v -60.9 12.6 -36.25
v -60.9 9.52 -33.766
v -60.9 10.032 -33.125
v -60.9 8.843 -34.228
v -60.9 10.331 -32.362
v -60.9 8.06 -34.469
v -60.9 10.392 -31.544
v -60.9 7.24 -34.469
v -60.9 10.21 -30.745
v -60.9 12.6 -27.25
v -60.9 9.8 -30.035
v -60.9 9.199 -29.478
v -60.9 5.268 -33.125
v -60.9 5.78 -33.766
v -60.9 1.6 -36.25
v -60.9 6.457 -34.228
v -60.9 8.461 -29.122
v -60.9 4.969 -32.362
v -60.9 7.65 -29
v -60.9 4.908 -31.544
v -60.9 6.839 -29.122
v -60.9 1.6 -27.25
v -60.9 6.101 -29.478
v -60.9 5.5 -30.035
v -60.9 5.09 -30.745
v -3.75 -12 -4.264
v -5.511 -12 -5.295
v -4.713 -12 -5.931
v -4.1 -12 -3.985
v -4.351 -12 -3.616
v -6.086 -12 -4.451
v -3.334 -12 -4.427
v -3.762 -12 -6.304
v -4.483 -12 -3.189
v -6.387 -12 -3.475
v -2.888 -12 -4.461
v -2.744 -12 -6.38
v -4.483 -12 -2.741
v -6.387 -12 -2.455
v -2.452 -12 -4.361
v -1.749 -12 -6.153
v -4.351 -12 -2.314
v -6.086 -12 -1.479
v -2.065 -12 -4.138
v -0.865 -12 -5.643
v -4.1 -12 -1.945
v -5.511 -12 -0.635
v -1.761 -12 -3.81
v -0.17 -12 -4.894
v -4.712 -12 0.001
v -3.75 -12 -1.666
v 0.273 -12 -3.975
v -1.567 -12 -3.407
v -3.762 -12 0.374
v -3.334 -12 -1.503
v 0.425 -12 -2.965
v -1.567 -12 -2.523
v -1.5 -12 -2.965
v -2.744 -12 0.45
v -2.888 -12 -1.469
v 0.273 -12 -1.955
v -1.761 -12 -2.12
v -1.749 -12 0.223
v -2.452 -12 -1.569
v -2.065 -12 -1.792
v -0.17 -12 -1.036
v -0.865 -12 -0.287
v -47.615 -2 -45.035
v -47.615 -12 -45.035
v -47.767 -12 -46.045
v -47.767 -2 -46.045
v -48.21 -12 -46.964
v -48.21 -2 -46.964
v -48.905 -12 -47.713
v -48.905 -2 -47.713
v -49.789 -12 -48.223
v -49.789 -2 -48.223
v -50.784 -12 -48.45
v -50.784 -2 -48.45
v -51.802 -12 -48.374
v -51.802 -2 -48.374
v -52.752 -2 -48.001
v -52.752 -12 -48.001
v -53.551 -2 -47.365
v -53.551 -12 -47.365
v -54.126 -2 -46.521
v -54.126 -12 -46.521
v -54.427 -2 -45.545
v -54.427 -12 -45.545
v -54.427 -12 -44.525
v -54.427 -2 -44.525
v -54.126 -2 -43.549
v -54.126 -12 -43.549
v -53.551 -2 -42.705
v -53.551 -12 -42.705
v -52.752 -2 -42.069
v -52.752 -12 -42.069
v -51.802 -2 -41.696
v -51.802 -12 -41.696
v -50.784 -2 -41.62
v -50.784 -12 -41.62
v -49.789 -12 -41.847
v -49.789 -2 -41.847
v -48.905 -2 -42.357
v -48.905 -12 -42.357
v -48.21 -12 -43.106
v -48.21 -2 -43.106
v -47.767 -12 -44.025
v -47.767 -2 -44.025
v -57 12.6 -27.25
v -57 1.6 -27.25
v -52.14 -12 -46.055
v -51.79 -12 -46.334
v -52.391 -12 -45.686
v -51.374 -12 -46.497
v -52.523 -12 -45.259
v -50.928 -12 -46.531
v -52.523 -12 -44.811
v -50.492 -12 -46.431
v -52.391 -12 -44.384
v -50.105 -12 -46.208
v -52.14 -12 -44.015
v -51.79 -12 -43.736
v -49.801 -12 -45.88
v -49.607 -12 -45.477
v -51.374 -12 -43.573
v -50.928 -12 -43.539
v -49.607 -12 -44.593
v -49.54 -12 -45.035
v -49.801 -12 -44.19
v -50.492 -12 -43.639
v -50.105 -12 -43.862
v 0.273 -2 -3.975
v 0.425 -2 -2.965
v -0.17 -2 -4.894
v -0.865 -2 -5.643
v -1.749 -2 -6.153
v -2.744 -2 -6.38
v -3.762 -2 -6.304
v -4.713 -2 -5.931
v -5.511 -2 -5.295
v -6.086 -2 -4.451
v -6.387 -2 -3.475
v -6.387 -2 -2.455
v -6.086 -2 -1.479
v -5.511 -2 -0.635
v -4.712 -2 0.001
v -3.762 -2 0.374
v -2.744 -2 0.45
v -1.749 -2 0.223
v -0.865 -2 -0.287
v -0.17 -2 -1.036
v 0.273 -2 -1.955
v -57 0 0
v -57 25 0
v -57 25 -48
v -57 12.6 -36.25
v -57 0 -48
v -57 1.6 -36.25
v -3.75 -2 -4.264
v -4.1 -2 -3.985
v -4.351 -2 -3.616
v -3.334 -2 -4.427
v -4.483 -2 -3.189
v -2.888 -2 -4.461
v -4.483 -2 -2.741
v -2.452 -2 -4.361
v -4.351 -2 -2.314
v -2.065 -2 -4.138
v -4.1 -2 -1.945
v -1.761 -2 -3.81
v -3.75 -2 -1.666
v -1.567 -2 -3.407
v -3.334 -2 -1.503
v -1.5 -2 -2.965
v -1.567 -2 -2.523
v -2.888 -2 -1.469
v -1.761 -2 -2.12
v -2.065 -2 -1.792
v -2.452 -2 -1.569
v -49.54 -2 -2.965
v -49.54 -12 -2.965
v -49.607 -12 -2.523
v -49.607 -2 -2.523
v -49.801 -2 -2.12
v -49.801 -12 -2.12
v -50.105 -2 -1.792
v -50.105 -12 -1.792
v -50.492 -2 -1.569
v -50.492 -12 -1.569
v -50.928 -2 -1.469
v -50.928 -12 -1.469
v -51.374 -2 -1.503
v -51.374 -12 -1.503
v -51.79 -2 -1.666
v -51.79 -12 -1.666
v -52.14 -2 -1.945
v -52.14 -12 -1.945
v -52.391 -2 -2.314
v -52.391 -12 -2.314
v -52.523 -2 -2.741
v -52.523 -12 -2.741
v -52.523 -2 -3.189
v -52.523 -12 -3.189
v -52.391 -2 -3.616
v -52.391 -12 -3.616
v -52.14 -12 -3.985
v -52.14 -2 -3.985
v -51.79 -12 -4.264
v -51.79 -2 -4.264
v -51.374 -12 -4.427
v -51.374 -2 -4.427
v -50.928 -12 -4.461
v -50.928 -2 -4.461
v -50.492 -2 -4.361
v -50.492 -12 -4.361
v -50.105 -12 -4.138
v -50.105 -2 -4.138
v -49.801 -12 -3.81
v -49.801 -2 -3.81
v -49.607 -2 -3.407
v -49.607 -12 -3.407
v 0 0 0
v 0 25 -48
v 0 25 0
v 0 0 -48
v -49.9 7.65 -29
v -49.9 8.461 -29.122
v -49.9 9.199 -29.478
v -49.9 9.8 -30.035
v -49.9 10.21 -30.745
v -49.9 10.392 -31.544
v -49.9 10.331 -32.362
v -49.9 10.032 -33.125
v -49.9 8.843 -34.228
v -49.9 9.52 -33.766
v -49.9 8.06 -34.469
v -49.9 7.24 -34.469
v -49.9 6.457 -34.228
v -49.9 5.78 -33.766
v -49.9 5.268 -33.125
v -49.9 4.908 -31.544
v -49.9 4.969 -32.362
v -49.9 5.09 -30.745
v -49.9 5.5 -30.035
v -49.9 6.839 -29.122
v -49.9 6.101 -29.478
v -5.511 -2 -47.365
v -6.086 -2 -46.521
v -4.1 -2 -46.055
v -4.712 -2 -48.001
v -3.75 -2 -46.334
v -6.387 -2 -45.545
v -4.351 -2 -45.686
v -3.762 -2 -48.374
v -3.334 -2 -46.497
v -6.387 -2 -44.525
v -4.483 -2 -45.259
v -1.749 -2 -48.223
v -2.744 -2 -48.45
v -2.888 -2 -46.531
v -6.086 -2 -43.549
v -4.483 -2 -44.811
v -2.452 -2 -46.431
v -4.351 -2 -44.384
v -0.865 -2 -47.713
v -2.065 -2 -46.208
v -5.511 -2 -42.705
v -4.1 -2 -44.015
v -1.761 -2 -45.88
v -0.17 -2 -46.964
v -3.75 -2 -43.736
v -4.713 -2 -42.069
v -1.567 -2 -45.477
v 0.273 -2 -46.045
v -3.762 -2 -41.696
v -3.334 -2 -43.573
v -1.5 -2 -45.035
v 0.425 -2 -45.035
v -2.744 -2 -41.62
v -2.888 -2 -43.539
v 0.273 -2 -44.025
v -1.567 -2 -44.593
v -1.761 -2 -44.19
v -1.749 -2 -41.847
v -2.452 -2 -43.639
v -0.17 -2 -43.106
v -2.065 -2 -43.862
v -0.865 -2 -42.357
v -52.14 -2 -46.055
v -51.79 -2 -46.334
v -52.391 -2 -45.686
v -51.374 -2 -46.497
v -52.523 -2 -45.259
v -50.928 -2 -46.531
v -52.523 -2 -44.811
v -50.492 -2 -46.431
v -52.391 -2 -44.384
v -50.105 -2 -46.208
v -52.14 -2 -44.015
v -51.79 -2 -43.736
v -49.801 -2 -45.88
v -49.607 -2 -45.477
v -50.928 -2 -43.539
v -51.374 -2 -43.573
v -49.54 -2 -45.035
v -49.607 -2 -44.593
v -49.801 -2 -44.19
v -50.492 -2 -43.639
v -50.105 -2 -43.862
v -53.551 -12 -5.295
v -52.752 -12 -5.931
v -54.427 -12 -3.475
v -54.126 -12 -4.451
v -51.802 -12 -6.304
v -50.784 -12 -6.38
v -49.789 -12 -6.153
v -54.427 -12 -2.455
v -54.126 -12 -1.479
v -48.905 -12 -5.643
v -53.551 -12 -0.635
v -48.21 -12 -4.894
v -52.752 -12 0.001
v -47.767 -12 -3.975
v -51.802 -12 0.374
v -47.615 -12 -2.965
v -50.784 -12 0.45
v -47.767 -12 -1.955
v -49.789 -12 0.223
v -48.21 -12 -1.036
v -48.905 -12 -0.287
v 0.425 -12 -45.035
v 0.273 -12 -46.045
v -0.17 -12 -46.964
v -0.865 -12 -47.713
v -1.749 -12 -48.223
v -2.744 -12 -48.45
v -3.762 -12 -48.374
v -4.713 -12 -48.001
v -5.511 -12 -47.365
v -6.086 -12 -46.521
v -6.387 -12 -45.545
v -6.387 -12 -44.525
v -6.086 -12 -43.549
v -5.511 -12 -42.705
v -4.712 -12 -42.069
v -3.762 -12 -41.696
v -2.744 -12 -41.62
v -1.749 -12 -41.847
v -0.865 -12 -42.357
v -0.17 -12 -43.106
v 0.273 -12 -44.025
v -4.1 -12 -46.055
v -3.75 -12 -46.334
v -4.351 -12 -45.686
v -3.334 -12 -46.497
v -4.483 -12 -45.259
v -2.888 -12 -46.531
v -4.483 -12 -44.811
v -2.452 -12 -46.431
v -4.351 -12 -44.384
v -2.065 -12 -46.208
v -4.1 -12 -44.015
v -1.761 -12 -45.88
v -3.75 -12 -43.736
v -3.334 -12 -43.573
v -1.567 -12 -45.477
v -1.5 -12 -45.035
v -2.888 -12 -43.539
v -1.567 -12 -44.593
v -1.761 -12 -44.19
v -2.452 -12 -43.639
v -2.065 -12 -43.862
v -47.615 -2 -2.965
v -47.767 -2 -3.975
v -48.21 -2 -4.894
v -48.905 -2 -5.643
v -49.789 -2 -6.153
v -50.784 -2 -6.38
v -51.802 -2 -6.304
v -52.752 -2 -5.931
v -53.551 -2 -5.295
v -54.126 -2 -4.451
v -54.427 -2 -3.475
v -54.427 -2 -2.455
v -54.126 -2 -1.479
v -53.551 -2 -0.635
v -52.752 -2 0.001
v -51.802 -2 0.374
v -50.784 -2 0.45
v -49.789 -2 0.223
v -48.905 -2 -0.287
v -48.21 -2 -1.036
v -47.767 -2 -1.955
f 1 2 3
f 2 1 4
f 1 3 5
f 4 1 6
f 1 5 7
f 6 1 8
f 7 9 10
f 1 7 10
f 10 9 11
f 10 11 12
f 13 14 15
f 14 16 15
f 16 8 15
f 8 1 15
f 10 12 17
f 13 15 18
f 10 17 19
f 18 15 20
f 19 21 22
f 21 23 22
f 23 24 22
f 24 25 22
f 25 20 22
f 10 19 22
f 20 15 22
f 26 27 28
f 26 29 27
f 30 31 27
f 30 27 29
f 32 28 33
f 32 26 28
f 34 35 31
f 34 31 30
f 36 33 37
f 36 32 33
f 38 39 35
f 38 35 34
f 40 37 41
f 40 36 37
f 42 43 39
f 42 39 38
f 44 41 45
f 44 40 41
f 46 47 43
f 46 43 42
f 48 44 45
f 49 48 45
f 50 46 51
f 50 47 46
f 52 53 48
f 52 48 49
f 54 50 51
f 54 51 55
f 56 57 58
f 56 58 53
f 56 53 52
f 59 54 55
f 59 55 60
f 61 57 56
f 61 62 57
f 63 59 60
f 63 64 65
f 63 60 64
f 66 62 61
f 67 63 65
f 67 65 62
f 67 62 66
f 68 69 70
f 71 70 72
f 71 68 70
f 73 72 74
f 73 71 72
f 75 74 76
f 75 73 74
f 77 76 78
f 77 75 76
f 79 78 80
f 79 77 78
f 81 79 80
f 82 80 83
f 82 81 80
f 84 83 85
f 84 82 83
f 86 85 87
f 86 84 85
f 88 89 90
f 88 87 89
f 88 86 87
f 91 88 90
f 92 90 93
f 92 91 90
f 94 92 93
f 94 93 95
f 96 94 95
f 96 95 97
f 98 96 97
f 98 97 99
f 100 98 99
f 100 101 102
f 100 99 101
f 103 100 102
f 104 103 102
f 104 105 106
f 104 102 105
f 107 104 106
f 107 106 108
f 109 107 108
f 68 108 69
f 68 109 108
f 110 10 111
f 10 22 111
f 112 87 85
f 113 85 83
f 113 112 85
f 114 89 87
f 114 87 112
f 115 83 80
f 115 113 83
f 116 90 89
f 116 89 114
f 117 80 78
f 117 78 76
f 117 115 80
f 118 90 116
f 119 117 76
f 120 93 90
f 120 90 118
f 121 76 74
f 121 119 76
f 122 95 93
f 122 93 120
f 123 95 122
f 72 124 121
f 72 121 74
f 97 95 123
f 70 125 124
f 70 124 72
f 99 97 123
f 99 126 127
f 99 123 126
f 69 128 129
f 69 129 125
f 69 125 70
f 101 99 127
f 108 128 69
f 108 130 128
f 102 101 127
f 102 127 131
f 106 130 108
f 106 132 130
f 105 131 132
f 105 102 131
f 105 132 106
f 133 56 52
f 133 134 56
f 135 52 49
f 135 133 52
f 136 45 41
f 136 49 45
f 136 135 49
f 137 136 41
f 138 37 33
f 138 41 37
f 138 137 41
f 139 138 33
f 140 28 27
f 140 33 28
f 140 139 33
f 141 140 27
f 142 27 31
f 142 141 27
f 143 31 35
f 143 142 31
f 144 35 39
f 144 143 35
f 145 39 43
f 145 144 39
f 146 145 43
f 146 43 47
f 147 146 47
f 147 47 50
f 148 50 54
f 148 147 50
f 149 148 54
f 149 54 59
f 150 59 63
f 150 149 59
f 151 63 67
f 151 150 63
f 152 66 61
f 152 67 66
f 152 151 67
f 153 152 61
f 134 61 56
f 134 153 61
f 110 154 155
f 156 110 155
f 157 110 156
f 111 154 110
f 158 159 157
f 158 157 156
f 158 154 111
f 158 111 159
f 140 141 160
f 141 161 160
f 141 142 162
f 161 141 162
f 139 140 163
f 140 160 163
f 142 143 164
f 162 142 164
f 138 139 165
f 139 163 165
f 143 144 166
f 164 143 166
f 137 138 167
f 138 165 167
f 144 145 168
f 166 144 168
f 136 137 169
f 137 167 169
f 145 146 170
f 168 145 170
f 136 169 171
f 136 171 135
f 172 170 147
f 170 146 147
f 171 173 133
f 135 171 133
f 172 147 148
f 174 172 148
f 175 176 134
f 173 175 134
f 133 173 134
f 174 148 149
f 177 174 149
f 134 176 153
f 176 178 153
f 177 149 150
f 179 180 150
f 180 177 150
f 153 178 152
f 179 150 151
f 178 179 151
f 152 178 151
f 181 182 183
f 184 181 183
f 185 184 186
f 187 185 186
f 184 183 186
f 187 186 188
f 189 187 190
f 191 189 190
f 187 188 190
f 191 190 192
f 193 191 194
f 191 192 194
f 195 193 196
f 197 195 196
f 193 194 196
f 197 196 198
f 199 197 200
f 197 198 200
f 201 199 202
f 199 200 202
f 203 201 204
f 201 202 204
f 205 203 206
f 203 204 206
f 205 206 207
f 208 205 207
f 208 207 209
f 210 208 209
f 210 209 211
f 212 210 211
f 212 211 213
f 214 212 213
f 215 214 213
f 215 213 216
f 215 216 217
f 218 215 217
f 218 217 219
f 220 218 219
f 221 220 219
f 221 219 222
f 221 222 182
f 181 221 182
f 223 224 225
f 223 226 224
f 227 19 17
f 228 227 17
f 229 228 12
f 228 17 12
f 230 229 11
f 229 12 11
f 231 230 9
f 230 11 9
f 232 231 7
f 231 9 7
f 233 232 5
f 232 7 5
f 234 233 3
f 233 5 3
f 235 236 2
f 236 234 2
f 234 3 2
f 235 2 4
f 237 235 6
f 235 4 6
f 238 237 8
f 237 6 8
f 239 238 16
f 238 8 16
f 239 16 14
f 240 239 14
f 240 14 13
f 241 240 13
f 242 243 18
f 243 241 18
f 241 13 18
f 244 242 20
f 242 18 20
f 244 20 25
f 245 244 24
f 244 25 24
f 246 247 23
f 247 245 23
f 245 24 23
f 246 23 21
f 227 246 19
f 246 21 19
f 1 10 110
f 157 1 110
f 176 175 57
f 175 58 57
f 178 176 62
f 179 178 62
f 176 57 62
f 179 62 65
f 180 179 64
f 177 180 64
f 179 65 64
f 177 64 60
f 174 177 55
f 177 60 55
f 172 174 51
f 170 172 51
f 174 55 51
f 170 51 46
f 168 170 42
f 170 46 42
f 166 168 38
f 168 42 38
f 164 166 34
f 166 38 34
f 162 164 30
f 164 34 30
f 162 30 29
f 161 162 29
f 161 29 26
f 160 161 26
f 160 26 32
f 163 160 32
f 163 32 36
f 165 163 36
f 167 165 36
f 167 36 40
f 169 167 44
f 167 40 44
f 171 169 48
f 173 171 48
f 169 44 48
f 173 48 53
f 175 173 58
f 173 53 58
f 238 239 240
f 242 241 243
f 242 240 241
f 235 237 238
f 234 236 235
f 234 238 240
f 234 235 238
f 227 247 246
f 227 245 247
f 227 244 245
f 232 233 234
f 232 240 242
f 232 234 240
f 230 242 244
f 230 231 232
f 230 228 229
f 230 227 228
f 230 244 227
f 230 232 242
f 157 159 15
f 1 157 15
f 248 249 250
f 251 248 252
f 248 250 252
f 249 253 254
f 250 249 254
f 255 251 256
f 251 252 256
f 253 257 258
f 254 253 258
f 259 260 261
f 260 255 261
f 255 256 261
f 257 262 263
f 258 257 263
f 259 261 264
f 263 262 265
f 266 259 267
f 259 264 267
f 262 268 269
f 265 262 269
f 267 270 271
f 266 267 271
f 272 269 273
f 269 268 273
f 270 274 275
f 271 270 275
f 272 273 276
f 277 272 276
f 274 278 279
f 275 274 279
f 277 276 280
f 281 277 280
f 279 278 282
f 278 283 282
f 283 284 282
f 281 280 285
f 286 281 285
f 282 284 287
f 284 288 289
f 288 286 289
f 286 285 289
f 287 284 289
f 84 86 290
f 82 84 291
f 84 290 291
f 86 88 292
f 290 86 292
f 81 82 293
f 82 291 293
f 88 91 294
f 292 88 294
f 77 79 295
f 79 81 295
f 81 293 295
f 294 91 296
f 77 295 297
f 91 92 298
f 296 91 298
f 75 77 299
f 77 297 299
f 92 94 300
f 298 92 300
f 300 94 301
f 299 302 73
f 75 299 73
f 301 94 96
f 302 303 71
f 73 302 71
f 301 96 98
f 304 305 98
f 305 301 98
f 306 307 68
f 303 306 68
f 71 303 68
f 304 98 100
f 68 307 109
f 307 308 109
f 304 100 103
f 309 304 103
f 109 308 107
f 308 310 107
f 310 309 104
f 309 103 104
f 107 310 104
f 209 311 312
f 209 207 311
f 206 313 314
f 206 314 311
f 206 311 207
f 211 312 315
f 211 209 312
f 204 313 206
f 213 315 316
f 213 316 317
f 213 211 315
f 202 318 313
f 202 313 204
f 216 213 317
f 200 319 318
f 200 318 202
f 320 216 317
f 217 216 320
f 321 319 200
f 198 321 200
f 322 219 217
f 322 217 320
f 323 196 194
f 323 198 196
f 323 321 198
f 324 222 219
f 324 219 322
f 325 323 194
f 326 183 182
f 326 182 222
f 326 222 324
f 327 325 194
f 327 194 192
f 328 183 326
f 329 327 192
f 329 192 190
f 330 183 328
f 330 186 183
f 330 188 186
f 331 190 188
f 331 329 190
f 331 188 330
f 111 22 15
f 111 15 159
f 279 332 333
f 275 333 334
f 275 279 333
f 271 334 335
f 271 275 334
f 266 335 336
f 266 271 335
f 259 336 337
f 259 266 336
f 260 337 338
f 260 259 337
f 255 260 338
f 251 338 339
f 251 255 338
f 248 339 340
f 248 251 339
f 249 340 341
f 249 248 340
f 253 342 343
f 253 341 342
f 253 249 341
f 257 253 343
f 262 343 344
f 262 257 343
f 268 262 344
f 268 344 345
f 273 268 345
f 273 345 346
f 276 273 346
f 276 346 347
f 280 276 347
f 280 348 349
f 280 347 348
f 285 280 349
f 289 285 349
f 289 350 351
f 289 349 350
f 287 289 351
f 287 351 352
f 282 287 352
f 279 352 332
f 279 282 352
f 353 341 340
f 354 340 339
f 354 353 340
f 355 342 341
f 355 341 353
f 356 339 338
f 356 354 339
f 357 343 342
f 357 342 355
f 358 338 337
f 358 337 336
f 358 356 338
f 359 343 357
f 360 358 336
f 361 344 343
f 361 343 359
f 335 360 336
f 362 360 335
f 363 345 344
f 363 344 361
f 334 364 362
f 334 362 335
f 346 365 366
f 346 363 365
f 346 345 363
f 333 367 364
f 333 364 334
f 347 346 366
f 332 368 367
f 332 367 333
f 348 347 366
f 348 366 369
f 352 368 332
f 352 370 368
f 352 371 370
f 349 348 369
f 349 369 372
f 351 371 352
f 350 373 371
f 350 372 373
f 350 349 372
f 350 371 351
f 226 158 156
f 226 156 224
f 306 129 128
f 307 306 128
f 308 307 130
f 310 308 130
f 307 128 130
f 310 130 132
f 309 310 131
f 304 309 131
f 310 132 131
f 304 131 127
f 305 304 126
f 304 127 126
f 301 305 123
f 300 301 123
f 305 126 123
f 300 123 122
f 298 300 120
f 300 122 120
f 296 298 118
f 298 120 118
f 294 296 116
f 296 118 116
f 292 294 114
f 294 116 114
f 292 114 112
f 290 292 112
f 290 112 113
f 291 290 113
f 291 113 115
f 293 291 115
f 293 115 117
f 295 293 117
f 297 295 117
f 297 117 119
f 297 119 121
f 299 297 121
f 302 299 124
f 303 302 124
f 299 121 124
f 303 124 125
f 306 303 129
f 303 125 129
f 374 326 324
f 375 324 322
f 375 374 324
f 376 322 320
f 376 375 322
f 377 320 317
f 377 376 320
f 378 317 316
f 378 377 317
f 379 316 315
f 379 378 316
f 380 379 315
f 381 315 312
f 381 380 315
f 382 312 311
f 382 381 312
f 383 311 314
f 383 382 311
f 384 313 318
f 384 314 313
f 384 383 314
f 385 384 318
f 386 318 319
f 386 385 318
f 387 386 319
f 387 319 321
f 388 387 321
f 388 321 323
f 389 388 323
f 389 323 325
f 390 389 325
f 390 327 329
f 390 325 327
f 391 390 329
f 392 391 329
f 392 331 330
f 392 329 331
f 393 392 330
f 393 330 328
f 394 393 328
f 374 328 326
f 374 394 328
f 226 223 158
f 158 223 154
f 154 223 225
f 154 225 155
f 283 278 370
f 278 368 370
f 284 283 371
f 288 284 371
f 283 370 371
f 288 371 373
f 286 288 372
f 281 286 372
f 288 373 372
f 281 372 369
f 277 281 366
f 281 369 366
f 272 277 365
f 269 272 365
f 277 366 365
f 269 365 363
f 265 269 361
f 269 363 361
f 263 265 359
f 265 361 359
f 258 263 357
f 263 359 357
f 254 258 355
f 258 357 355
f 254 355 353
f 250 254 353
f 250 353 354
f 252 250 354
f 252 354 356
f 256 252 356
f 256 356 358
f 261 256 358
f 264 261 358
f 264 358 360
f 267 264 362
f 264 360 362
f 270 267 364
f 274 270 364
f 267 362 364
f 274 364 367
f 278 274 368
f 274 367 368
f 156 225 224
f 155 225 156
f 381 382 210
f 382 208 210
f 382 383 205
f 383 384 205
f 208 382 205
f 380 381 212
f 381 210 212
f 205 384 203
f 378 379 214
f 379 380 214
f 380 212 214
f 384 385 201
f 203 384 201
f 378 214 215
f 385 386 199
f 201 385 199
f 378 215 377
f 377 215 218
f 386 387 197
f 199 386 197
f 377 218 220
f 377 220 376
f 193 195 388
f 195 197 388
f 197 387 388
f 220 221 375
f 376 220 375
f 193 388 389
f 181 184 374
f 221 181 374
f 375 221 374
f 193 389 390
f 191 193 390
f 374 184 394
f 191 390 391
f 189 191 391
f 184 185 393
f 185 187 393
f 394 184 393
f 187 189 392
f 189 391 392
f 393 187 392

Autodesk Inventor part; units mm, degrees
ref_plane "YZ Plane" through (0, 0, 0) normal (1, 0, 0) x (0, 1, 0)
ref_plane "XZ Plane" through (0, 0, 0) normal (0, 1, 0) x (-1, 0, 0)
ref_plane "XY Plane" through (0, 0, 0) normal (0, 0, 1) x (1, 0, 0)
sketch "Sketch1" plane through (0, 0, 0) normal (0, 1, 0) x (-1, 0, 0)
  line L0 (0, 0) -> (57, 0)
  line L1 (57, 0) -> (57, -48)
  line L2 (57, -48) -> (0, -48)
  line L3 (0, -48) -> (0, 0)
  dimension "d0" = 57
  dimension "d1" = 48
extrude "Extrusion1" add sketch "Sketch1" along normal blind 25
sketch "Sketch5" plane through (0, 0, 0) normal (0, -1, 0) x (1, 0, 0)
  circle A0 centre (-3, -2.965) radius 1.5 projected
  circle A1 centre (-3, -2.965) radius 3.425
  circle A2 centre (-3, -45.035) radius 1.5 projected
  circle A3 centre (-3, -45.035) radius 3.425
  circle A4 centre (-51.04, -45.035) radius 1.5 projected
  circle A5 centre (-51.04, -45.035) radius 3.425
  circle A6 centre (-51.04, -2.965) radius 1.5 projected
  circle A7 centre (-51.04, -2.965) radius 3.425
  point P0 (0, 0)
  dimension "d19" = 6.85
  dimension "d20" = 6.85
  dimension "d21" = 6.85
  dimension "d22" = 6.85
extrude "Extrusion5" add sketch "Sketch5" along normal blind 12 contours A0 | A1 | A2 | A3 | A4 | A5 | A6 | A7
sketch "Sketch6" plane through (0, 0, 0) normal (0, -1, 0) x (1, 0, 0)
  line L0 (-57, 0) -> (0, 0) projected
  line L1 (0, 0) -> (-57, 0)
  line L2 (-57, -48) -> (-57, 0) projected
  line L3 (-57, 0) -> (-57, -48)
  line L4 (-57, -48) -> (-57, -36.25)
  line L5 (-57, -36.25) -> (-60.9, -36.25)
  line L6 (-60.9, -36.25) -> (-60.9, -27.25)
  line L7 (-60.9, -27.25) -> (-57, -27.25)
  dimension "d25" = 11.75
  dimension "d26" = 3.9
  dimension "d27" = 9
extrude "Extrusion6" add sketch "Sketch6" against normal blind 12.6
sketch "Sketch7" plane through (0, 0, 0) normal (0, -1, 0) x (1, 0, 0)
  line L0 (-60.9, -27.25) -> (-60.9, -36.25) projected
  line L1 (-60.9, -36.25) -> (-57, -36.25)
  line L2 (-57, -36.25) -> (-57, -27.25)
  line L3 (-57, -27.25) -> (-60.9, -27.25)
  line L4 (-60.9, -27.25) -> (-60.9, -36.25)
  point P0 (0, 0)
extrude "Extrusion7" cut sketch "Sketch7" against normal blind 1.6
sketch "Sketch8" plane through (-60.9, 12.6, -36.25) normal (-1, 0, 0) x (0, 0, 1)
  line L0 (0, -11) -> (0, 0) projected
  line L1 (0, -11) -> (0, -7.7)
  line L2 (0, -7.7) -> (9, -7.7)
  line L3 (9, 0) -> (9, -11) projected
  line L4 (4.5, -7.7) -> (4.5, -4.95)
  circle A0 centre (4.5, -4.95) radius 2.75
  point P0 (36.25, -12.6)
  dimension "d32" = 3.3
  dimension "d33" = 2.75
  dimension "d34" = 5.5
extrude "Extrusion8" cut sketch "Sketch8" against normal blind 11
sketch "Sketch9" plane through (-3, -12, -45.035) normal (0, -1, 0) x (1, 0, 0)
  circle A0 centre (0, 0) radius 1.5 projected
  circle A1 centre (0, 0) radius 1.5
  circle A2 centre (-48.04, 0) radius 1.5 projected
  circle A3 centre (-48.04, 0) radius 1.5
  arc A4 (-1.7145, 45.035) -> (3, 40.4175) centre (0, 42.07) ccw projected
  circle A5 centre (0, 42.07) radius 1.5
  circle A6 centre (-48.04, 42.07) radius 3.425 projected
  circle A7 centre (-48.04, 42.07) radius 1.5
  point P0 (3, 45.035)
  dimension "d37" = 3
  dimension "d38" = 3
  dimension "d39" = 3
  dimension "d40" = 3
extrude "Extrusion9" cut sketch "Sketch9" against normal blind 10 contours A0 | A2 | A5 | A7
sketch "Sketch10" plane through (0, 0, 0) normal (0, -1, 0) x (1, 0, 0)
  circle A0 centre (-3, -2.965) radius 1.5 projected
  circle A1 centre (-3, -2.965) radius 3.425
  circle A2 centre (-3, -45.035) radius 1.5 projected
  circle A3 centre (-3, -45.035) radius 3.7391
  arc A4 (-49.3255, -48) -> (-52.7545, -48) centre (-51.04, -45.035) ccw projected
  circle A5 centre (-51.04, -45.035) radius 4.1753
  circle A6 centre (-51.04, -2.965) radius 1.5 projected
  circle A7 centre (-51.04, -2.965) radius 4.4366
  point P0 (0, 0)
extrude "Extrusion10" cut sketch "Sketch10" along normal blind 2 contours A0 | A1 | A2 | A3 | A5 | A6 | A7
properties part number "U2D2PHB_Board"
